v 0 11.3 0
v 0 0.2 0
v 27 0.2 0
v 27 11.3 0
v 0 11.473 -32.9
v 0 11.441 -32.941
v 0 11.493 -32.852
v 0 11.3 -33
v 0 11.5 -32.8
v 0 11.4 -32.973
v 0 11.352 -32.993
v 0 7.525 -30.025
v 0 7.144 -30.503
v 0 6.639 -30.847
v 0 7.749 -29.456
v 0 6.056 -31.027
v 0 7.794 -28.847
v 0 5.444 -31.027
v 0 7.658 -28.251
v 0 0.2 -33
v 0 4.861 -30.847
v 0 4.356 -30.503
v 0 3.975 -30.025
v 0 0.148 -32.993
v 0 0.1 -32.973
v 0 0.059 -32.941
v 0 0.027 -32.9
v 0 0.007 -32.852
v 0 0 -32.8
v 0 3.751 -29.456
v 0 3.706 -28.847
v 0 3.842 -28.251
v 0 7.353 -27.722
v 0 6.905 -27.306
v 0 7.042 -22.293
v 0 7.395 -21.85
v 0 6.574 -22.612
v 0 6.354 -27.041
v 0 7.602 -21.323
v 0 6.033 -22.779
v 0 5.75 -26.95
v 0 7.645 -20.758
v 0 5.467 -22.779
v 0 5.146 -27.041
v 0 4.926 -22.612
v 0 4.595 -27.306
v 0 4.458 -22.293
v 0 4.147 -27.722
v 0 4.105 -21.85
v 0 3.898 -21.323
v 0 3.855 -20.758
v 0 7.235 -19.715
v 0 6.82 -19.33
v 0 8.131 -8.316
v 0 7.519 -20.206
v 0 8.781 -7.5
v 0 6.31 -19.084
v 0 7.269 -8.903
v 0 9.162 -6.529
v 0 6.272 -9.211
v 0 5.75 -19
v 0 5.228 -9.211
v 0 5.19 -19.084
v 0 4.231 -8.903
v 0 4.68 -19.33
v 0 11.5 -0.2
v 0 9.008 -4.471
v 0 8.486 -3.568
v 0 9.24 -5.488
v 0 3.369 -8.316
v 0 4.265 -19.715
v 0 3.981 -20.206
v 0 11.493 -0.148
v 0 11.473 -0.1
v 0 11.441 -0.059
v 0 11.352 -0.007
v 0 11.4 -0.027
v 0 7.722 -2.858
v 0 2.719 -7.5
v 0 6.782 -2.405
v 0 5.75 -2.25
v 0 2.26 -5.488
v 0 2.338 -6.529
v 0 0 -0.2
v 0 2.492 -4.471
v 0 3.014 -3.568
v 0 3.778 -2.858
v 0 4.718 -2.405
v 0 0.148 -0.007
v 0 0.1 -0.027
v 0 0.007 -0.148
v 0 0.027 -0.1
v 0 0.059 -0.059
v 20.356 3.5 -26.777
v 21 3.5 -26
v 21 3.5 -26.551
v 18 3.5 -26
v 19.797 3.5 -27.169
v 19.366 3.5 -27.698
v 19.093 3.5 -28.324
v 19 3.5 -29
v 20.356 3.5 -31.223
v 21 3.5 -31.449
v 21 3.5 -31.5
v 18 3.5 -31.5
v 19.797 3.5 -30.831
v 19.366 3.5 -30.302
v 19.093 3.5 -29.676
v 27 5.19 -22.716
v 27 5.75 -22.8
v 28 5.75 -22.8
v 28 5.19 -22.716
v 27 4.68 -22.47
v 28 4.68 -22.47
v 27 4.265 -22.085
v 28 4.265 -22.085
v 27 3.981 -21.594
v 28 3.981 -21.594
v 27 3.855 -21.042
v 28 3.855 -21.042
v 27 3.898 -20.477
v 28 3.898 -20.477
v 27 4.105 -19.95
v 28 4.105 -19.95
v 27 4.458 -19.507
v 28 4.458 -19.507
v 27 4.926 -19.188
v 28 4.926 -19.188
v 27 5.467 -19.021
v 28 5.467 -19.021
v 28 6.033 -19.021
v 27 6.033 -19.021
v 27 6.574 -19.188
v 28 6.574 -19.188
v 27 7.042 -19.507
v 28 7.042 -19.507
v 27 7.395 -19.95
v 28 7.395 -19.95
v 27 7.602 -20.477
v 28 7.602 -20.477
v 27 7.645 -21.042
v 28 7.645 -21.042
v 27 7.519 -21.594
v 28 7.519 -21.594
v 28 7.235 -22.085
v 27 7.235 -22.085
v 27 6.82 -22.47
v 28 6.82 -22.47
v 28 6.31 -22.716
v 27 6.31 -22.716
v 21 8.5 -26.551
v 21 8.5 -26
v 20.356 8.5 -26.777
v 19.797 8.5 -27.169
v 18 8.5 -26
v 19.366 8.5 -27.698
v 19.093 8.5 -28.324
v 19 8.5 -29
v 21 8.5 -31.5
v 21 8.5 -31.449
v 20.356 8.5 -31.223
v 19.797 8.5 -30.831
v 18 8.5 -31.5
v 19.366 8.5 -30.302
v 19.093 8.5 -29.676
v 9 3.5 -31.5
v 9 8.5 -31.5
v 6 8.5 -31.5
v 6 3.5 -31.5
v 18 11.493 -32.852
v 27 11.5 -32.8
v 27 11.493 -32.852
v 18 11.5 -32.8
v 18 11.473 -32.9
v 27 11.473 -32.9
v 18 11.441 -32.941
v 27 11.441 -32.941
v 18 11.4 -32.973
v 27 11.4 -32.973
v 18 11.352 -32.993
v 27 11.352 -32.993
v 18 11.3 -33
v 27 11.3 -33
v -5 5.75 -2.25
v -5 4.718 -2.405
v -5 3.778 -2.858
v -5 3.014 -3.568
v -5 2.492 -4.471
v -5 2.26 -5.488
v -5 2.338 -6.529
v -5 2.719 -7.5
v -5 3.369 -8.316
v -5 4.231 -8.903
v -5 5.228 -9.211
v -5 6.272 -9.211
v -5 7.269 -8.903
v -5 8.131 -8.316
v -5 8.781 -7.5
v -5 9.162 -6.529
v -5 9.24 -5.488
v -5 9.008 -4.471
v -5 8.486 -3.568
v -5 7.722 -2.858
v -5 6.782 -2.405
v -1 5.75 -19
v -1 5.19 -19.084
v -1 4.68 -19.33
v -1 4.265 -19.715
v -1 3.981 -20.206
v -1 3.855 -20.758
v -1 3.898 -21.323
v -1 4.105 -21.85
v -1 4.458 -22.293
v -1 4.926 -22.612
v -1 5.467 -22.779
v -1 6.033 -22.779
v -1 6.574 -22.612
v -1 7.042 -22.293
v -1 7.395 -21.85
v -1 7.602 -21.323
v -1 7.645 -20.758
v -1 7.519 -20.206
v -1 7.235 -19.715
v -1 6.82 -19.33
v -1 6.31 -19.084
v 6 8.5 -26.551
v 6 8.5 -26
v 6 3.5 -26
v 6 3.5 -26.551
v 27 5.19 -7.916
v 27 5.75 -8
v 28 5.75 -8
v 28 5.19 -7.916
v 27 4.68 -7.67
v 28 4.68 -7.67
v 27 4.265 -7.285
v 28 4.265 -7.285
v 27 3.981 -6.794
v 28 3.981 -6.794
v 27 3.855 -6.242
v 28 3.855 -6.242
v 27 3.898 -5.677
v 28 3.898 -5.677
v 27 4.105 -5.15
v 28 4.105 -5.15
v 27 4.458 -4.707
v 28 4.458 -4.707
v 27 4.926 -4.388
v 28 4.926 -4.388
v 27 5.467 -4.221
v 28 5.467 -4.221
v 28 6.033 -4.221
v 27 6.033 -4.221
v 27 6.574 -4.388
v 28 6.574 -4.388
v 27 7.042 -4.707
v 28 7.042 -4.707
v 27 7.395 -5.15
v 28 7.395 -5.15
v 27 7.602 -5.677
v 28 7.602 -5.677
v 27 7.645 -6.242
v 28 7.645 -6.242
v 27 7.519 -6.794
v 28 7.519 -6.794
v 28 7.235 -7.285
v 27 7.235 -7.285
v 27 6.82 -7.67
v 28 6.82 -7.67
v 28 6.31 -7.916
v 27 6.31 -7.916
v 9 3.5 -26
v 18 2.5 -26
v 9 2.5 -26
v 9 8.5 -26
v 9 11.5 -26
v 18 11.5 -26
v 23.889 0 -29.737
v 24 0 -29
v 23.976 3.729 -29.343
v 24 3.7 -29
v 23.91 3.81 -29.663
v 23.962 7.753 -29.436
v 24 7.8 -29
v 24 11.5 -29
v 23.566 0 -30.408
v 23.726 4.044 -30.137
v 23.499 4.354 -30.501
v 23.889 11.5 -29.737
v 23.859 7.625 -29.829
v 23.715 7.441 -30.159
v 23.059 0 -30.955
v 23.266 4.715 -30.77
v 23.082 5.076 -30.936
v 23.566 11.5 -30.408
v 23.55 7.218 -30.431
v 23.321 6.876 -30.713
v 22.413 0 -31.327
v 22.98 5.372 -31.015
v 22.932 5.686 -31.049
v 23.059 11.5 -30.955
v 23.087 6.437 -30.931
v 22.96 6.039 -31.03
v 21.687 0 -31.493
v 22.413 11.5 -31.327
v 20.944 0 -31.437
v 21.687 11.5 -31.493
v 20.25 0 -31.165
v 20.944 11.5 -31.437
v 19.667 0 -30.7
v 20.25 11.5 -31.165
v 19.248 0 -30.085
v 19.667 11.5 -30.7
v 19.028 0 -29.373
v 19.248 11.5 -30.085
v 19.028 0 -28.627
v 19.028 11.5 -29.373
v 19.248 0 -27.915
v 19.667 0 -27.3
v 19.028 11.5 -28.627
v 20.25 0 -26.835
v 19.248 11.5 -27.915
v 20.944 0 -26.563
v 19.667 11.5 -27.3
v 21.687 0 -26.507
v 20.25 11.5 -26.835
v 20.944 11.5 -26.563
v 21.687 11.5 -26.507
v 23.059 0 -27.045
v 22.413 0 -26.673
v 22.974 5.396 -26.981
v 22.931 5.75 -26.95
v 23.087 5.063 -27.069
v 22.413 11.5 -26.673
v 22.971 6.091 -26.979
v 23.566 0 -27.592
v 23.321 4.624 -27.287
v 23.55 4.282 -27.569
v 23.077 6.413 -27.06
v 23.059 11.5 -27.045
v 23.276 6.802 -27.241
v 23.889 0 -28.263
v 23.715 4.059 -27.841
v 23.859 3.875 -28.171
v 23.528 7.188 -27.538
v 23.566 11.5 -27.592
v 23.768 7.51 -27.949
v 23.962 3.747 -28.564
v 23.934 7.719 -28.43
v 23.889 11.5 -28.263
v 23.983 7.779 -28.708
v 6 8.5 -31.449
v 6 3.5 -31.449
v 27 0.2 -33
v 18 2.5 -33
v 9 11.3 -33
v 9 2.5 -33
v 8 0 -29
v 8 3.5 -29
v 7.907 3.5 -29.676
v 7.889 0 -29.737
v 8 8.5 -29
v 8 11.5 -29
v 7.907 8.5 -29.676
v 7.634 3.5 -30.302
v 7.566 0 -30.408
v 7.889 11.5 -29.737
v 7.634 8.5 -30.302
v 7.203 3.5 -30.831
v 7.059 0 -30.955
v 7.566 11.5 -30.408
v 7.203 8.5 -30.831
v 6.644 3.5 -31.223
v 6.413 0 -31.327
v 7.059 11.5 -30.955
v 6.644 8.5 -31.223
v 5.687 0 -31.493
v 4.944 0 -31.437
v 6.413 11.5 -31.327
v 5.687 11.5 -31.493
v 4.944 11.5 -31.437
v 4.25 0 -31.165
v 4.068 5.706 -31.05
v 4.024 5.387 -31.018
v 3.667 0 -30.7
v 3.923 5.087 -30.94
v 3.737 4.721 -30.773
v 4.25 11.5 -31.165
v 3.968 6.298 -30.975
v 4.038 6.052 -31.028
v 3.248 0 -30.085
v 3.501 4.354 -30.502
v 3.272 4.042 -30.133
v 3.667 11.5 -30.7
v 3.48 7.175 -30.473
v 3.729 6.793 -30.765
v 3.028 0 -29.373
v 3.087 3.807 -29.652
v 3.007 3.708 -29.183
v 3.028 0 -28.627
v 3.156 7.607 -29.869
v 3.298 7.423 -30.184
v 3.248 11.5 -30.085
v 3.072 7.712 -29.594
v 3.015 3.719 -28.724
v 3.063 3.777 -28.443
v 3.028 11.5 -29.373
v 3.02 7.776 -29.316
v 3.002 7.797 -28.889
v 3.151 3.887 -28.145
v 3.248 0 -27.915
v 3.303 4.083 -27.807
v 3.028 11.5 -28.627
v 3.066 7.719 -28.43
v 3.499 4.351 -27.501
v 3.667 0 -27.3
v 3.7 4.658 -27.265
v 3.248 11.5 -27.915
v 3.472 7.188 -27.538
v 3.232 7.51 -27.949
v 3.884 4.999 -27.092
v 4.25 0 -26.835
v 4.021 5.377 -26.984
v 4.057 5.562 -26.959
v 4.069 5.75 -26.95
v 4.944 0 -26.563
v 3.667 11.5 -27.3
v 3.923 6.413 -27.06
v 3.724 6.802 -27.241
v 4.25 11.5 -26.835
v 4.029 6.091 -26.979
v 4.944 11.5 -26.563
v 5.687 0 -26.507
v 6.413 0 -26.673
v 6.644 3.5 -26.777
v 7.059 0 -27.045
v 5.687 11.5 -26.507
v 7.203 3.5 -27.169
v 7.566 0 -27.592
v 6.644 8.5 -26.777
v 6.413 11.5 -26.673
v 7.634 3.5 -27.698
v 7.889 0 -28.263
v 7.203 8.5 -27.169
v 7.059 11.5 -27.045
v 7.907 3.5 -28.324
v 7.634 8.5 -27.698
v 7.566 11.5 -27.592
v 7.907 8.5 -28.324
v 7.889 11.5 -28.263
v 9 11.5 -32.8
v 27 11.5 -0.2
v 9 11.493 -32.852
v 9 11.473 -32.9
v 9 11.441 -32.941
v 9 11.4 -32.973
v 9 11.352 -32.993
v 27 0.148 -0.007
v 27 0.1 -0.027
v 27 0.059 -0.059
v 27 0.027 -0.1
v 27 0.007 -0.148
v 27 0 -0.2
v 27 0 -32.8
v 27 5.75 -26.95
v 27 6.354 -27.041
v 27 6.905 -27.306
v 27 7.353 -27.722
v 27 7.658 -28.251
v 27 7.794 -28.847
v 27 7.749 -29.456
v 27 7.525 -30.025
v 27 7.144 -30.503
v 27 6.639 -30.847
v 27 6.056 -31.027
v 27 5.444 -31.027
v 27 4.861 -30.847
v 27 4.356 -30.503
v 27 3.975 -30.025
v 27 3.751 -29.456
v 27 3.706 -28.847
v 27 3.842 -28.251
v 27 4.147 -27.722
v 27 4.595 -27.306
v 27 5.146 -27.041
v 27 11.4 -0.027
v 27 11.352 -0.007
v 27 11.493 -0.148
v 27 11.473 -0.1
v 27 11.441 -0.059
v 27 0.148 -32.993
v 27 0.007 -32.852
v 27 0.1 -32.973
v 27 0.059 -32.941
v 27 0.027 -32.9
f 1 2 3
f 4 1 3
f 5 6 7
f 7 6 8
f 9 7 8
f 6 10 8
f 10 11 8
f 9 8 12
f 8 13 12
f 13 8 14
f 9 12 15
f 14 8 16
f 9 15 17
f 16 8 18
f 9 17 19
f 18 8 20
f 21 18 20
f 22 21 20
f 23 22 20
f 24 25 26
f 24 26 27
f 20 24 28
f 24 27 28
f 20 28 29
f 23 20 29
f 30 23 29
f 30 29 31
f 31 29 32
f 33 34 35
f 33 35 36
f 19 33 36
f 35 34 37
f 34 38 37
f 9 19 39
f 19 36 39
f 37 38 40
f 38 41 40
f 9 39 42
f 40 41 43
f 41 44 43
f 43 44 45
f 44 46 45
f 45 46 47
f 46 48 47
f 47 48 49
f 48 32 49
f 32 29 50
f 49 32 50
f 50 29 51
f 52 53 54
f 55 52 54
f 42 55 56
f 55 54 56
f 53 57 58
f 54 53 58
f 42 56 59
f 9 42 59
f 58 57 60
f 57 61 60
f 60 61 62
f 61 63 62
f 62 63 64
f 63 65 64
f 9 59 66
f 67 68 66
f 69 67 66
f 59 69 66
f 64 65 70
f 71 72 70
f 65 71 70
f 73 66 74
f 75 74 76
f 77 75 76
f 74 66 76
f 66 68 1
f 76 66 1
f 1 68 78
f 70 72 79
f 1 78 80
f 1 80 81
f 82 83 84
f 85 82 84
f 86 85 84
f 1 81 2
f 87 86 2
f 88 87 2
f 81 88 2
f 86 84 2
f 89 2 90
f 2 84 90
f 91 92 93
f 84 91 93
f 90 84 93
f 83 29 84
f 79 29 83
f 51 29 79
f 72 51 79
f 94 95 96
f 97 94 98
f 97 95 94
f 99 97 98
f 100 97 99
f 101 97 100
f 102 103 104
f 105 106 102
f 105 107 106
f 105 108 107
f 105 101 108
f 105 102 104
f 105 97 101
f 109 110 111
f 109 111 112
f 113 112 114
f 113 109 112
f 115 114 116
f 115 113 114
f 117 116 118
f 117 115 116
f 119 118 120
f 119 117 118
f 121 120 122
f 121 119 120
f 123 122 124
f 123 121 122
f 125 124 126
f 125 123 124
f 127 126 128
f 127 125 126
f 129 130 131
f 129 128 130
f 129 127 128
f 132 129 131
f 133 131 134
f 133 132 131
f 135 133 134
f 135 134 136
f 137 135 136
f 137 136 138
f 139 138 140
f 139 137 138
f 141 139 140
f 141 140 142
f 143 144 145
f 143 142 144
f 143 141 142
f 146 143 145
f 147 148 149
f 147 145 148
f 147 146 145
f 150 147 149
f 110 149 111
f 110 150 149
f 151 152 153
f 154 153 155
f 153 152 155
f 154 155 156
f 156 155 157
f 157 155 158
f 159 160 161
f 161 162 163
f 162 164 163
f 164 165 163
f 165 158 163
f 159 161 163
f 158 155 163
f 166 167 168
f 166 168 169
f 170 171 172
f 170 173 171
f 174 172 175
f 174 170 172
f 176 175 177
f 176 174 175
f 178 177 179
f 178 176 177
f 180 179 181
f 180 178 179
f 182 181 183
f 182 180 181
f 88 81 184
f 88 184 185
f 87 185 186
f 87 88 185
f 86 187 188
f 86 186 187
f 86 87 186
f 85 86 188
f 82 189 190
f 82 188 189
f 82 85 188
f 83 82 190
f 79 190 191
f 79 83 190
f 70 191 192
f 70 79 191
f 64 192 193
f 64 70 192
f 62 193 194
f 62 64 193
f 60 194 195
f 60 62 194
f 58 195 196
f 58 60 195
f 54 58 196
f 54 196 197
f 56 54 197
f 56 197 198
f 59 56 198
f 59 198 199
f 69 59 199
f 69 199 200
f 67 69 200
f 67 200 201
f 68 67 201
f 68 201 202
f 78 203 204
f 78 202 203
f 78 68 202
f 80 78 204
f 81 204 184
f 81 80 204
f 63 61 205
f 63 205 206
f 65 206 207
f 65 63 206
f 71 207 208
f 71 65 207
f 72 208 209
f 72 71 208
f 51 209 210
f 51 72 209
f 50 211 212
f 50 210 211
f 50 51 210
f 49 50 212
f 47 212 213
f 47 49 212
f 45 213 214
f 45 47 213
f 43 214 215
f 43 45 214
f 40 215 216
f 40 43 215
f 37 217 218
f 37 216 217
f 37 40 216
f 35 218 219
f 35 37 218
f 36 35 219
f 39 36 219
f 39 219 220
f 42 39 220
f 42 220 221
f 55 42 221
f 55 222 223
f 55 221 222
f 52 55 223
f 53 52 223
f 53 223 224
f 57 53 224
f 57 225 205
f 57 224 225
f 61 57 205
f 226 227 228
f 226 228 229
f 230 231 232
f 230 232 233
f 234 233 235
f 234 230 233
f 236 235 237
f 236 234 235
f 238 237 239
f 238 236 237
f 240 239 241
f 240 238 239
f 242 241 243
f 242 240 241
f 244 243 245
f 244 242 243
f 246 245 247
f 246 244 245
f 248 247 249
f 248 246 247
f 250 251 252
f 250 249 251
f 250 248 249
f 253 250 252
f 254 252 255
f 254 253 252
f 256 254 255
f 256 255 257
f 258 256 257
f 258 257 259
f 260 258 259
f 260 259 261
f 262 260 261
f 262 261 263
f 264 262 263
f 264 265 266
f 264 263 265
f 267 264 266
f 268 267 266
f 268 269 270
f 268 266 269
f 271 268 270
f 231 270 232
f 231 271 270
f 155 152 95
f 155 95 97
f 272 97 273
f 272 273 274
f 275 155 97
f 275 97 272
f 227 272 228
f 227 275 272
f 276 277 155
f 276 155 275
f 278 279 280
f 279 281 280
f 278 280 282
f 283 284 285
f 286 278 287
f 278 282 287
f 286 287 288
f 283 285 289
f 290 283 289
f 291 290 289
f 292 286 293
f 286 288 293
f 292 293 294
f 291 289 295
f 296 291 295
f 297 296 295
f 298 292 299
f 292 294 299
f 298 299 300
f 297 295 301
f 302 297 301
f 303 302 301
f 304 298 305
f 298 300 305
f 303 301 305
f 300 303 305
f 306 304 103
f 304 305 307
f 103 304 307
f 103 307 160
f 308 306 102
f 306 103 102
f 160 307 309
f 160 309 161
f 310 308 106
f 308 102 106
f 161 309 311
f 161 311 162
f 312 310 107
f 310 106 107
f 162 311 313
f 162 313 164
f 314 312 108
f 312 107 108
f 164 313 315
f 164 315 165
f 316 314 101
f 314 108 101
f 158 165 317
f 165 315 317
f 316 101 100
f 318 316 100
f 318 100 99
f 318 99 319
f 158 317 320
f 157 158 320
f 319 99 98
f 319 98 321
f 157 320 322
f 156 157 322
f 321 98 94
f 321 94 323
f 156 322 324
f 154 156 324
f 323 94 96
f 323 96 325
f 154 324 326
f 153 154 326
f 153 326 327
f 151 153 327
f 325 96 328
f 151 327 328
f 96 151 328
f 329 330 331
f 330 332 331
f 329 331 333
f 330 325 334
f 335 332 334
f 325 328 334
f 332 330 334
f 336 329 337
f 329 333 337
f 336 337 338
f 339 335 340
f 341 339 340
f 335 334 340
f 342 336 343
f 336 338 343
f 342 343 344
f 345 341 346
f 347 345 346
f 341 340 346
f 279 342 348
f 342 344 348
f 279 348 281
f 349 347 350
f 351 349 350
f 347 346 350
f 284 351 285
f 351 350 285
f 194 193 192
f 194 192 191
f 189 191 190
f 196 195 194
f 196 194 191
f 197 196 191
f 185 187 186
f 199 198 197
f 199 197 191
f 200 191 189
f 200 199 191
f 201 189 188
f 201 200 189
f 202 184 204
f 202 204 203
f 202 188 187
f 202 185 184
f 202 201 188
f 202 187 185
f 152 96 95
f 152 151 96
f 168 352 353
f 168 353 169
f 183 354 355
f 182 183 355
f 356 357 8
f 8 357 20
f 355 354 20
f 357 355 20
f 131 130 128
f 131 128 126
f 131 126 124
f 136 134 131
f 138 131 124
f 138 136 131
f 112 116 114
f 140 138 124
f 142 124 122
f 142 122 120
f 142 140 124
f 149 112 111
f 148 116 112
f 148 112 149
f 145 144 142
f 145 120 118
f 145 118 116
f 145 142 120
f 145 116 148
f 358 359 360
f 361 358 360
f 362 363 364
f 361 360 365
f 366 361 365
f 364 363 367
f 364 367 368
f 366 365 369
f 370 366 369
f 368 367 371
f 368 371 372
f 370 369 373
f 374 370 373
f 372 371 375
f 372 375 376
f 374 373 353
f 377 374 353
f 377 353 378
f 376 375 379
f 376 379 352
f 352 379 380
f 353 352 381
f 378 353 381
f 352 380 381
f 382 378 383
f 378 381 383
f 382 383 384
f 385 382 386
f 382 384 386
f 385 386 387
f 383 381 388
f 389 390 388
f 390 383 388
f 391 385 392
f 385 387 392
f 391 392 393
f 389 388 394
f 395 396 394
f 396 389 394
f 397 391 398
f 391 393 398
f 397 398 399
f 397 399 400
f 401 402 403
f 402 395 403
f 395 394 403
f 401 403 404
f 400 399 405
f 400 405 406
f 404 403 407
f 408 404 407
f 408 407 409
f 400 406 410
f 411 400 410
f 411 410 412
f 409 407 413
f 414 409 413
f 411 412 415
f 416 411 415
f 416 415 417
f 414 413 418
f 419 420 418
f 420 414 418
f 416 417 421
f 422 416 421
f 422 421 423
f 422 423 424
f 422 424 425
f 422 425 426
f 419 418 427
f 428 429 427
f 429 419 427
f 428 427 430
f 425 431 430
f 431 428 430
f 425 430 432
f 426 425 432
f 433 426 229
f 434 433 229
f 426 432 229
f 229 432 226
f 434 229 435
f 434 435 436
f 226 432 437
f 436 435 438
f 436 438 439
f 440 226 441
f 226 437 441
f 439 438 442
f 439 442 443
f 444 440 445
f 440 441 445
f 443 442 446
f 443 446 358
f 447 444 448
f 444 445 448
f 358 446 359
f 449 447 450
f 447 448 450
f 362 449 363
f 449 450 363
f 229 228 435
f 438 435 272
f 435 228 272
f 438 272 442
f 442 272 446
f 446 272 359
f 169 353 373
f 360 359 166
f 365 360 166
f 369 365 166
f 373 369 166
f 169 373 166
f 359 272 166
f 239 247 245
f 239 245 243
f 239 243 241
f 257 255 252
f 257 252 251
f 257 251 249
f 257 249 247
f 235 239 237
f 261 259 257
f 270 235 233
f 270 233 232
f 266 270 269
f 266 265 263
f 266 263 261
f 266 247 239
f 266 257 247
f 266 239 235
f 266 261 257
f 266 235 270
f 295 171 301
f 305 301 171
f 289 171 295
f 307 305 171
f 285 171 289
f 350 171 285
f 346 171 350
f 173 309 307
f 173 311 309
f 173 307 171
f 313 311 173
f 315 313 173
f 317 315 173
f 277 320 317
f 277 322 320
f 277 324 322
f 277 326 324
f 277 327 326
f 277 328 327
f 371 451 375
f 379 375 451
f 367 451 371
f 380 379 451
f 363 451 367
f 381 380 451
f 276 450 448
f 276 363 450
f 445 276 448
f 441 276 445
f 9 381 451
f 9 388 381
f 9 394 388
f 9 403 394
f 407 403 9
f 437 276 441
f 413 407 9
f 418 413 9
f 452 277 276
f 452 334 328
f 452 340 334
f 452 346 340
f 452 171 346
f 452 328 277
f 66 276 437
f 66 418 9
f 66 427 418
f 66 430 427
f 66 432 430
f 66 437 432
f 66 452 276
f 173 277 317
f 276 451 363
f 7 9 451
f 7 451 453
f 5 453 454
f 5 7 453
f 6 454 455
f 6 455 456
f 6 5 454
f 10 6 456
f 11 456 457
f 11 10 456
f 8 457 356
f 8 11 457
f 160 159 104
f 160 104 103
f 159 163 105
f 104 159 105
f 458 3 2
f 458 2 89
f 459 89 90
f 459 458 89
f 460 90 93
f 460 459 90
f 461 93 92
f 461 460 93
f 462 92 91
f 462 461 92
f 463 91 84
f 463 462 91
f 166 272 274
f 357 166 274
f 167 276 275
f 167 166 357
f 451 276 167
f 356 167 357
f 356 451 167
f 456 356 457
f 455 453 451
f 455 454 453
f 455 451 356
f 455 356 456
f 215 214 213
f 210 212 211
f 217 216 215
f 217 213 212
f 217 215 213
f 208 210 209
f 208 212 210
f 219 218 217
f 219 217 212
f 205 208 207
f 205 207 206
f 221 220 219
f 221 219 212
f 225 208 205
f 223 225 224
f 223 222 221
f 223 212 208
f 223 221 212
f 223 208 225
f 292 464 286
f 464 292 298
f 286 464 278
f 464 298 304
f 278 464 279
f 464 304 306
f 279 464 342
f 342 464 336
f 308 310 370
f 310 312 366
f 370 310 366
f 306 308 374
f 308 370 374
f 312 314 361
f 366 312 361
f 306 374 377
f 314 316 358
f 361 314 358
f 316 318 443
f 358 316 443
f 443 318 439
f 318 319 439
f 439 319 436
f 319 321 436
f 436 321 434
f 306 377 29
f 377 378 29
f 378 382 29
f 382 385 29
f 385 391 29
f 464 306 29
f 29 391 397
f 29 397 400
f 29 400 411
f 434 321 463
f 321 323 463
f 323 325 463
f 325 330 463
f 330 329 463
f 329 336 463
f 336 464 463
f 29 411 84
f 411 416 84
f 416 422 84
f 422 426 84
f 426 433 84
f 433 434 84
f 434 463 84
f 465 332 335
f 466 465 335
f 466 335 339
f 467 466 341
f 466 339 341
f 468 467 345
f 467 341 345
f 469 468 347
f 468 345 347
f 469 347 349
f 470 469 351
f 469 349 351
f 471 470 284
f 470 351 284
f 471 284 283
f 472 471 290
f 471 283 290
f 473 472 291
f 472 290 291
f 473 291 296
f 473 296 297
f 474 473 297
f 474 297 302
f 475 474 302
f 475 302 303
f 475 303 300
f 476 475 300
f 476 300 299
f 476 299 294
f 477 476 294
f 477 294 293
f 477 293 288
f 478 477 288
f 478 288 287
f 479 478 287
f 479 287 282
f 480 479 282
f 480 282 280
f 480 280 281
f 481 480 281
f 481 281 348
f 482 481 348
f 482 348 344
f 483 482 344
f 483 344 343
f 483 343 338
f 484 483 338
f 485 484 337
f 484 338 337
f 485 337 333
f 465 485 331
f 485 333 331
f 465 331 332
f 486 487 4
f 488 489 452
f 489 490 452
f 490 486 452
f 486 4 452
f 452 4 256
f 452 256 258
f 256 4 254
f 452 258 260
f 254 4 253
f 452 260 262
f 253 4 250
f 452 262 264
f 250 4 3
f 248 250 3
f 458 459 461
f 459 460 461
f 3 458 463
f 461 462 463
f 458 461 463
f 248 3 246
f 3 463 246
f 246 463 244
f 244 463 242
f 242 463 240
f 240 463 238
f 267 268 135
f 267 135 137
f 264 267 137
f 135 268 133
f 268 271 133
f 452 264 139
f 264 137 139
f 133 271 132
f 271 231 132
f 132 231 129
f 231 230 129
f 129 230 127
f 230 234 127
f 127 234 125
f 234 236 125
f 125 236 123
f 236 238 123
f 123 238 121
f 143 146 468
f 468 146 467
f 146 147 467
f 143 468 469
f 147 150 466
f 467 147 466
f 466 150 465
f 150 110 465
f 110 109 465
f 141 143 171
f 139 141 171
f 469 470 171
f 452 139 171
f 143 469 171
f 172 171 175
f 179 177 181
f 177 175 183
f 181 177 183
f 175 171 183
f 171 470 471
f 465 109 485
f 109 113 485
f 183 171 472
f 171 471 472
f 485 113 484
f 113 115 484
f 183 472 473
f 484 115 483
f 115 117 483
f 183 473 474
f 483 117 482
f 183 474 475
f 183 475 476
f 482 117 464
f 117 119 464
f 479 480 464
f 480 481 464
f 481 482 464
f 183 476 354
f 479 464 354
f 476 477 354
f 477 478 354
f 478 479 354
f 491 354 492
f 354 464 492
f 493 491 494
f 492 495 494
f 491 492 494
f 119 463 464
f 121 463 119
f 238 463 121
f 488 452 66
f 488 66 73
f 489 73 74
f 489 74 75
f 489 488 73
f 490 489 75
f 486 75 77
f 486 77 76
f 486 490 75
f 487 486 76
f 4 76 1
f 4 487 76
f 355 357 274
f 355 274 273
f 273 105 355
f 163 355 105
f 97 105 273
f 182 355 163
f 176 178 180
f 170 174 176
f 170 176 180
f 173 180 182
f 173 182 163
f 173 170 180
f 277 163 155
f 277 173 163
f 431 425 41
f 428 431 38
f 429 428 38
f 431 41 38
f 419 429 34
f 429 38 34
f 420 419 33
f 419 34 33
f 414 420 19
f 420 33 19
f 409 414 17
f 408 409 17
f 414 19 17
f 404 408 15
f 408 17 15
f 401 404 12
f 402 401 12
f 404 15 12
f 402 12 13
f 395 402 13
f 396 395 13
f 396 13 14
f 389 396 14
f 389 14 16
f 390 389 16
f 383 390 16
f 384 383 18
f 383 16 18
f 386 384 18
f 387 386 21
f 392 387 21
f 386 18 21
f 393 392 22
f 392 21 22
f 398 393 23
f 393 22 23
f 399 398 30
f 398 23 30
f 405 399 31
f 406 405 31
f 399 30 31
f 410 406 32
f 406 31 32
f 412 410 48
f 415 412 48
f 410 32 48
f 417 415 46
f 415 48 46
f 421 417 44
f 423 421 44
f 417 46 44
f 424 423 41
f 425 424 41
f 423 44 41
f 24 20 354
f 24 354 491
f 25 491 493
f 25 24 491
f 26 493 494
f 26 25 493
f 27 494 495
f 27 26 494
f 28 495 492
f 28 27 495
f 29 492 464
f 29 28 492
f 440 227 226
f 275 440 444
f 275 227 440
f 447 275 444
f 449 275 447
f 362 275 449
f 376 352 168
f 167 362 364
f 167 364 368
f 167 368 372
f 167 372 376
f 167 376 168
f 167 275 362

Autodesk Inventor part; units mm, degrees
ref_plane "YZ Plane" through (0, 0, 0) normal (1, 0, 0) x (0, 1, 0)
ref_plane "XZ Plane" through (0, 0, 0) normal (0, 1, 0) x (-1, 0, 0)
ref_plane "XY Plane" through (0, 0, 0) normal (0, 0, 1) x (1, 0, 0)
sketch "Sketch1" plane through (0, 0, 0) normal (0, 1, 0) x (-1, 0, 0)
  line L0 (0, 0) -> (-27, 0)
  line L1 (-27, 0) -> (-27, -33)
  line L2 (-27, -33) -> (0, -33)
  line L3 (0, -33) -> (0, 0)
  dimension "d0" = 33
  dimension "d1" = 27
extrude "Extrusion1" add sketch "Sketch1" along normal blind 11.5
sketch "Sketch2" plane through (0, 0, -33) normal (-1, 0, 0) x (0, 0, 1)
  circle A0 centre (27.25, 5.75) radius 3.5
  line L0 (0, 11.5) -> (33, 11.5) projected
  line L1 (33, 0) -> (33, 11.5) projected
  dimension "d4" = 7
  dimension "d5" = 5.75
  dimension "d6" = 5.75
extrude "Extrusion2" add sketch "Sketch2" along normal blind 5
sketch "Sketch3" plane through (0, 11.5, 0) normal (0, 1, 0) x (1, 0, 0)
  line L0 (27, 33) -> (0, 33) projected
  line L1 (9, 33) -> (18, 33)
  line L2 (18, 33) -> (18, 26)
  line L3 (18, 26) -> (9, 26)
  line L4 (9, 26) -> (9, 33)
  line L5 (27, 0) -> (27, 33) projected
  point P0 (0, 0)
  dimension "d9" = 9
  dimension "d10" = 9
  dimension "d11" = 7
extrude "Extrusion3" cut sketch "Sketch3" against normal blind 9
sketch "Sketch4" plane through (0, 11.5, 0) normal (0, 1, 0) x (1, 0, 0)
  circle A0 centre (5.5, 29) radius 2.5
  circle A1 centre (21.5, 29) radius 2.5
  line L0 (9, 33) -> (18, 33) construction
  line L1 (13.5, 33) -> (13.5, 0) construction
  line L2 (0, 0) -> (27, 0) construction
  line L3 (9, 33) -> (0, 33) construction
  dimension "d14" = 5
  dimension "d15" = 5
  dimension "d16" = 16
  dimension "d17" = 8
  dimension "d18" = 4
  dimension "d19" = 8
extrude "Extrusion4" cut sketch "Sketch4" against normal blind 15
sketch "Sketch5" plane through (0, 0, -33) normal (-1, 0, 0) x (0, 0, 1)
  circle A0 centre (4, 5.75) radius 2.05
  line L0 (0, 0) -> (0, 11.5) projected
  line L1 (33, 0) -> (33, 11.5) construction
  line L2 (33, 5.75) -> (0, 5.75) construction
  dimension "d22" = 4.1
  dimension "d23" = 4
  dimension "d24" = 0
extrude "Extrusion5" cut sketch "Sketch5" against normal blind 31.75
sketch "Sketch6" plane through (0, 0, 0) normal (0, -1, 0) x (1, 0, 0)
  point P0 (0, 0)
sketch "Sketch12" plane through (27, 0, -33) normal (1, 0, 0) x (0, 0, -1)
  line L0 (-33, 0) -> (0, 0) projected
  line L1 (-8.9949, 0) -> (-8.9949, 11.5163)
  point P0 (-32.75, 0)
sketch "Sketch13" plane through (0, 0, -33) normal (-1, 0, 0) x (0, 0, 1)
  line L0 (0, 0) -> (33, 0) projected
  line L1 (9, 0) -> (9, 11.5008)
  point P0 (32.75, 0)
sketch "Sketch16" plane through (0, 11.5, 0) normal (0, 1, 0) x (1, 0, 0)
  line L0 (0, 33) -> (0, 0) projected
  line L1 (27, 0) -> (27, 33) projected
  line L2 (11, 24) -> (11, 0)
  line L3 (21, 0) -> (21, 24)
  line L4 (0, 24) -> (11, 24)
  line L5 (21, 24) -> (27, 24)
sketch "Sketch17" plane through (0, 0, 0) normal (0, 0, 1) x (1, 0, 0)
  line L0 (0, 11.5) -> (27, 11.5) projected
  line L1 (11, 11.5) -> (11, 0)
  line L2 (21, 0) -> (21, 11.5)
  point P0 (0, 0)
sketch "Sketch18" plane through (0, 0, 0) normal (0, -1, 0) x (1, 0, 0)
  line L0 (27, 0) -> (27, -33) projected
  line L1 (0, 0) -> (27, 0) projected
  line L2 (21, 0) -> (21, -24)
  line L3 (11, 0) -> (11, -24)
  line L4 (27, -24) -> (21, -24)
  line L5 (11, -24) -> (0, -24)
  line L6 (27, -24) -> (27, -33)
  line L7 (0, -33) -> (0, 0) projected
  line L8 (0, -24) -> (0, -33)
  line L9 (0, -33) -> (27, -33)
  line L10 (21, 0) -> (11, 0)
fillet "Fillet5" radius 0.2 1 edges at (13.5, 11.5, 0)
fillet "Fillet7" radius 0.2 4 edges at (4.5, 11.5, -33) (22.5, 11.5, -33) (13.5, 0, -33) (13.5, 0, 0)
sketch "Sketch20" plane through (9, 2.5, -26) normal (1, 0, 0) x (0, 0, -1)
  line L0 (0, 6) -> (7, 6)
  line L1 (7, 8.8) -> (7, 0) projected
  line L2 (0, 6) -> (7, 6) construction
  line L3 (0, 9) -> (6.8, 9) projected
  line L4 (5.2368, 1.5) -> (10, 1.5) construction
  line L5 (0, 1.5) -> (0, 6)
  line L6 (0, 9) -> (0, 0) projected
  line L7 (0, 0) -> (0, 1)
  line L8 (0, 1) -> (5.2368, 1)
  line L9 (7, 6) -> (5.5, 6)
  line L10 (5.5, 6) -> (5.5, 1)
  line L11 (5.5, 1) -> (5.2368, 1)
  point P0 (-26, -2.5)
  dimension "d41" = 0
  dimension "d43" = 1
  dimension "d44" = 1.5
extrude "Extrusion6" cut sketch "Sketch20" against normal blind 3
sketch "Sketch21" plane through (18, 2.5, -26) normal (-1, 0, 0) x (0, 0, 1)
  line L0 (-7, 0) -> (0, 0) projected
  line L1 (0, 0) -> (0, 1)
  line L2 (0, 9) -> (0, 0) projected
  line L3 (0, 1) -> (-5.5, 1)
  line L4 (0, 9) -> (0, 6)
  line L5 (0, 6) -> (-5.5, 6)
  line L6 (-5.5, 6) -> (-5.5, 1)
  point P0 (26, -2.5)
  dimension "d47" = 1
  dimension "d48" = 5.5
  dimension "d49" = 3
  dimension "d50" = 5.5
extrude "Extrusion7" cut sketch "Sketch21" against normal blind 3
sketch "Sketch22" plane through (0, 0, -32.8) normal (-1, 0, 0) x (0, 0, 1)
  point P0 (32.8, 0)
sketch "Sketch23" plane through (0, 0, -32.8) normal (-1, 0, 0) x (0, 0, 1)
  line L0 (32.8, 0.2) -> (32.8, 11.3) projected
  line L1 (32.8, 5.75) -> (56.8, 5.75) construction
  circle A0 centre (11.9, 5.75) radius 1.9
  point P0 (32.8, 0)
extrude "Extrusion8" add sketch "Sketch23" along normal blind 1
sketch "Sketch24" plane through (27, 0, -0.2) normal (1, 0, 0) x (0, 0, -1)
  line L0 (-0.2, 0.2) -> (-0.2, 11.3) projected
  circle A0 centre (20.7, 5.75) radius 1.9
  circle A1 centre (5.9, 5.75) radius 1.9
  point P0 (-0.2, 0)
extrude "Extrusion9" add sketch "Sketch24" along normal blind 1
properties part number "MS 1.5A Servo"
